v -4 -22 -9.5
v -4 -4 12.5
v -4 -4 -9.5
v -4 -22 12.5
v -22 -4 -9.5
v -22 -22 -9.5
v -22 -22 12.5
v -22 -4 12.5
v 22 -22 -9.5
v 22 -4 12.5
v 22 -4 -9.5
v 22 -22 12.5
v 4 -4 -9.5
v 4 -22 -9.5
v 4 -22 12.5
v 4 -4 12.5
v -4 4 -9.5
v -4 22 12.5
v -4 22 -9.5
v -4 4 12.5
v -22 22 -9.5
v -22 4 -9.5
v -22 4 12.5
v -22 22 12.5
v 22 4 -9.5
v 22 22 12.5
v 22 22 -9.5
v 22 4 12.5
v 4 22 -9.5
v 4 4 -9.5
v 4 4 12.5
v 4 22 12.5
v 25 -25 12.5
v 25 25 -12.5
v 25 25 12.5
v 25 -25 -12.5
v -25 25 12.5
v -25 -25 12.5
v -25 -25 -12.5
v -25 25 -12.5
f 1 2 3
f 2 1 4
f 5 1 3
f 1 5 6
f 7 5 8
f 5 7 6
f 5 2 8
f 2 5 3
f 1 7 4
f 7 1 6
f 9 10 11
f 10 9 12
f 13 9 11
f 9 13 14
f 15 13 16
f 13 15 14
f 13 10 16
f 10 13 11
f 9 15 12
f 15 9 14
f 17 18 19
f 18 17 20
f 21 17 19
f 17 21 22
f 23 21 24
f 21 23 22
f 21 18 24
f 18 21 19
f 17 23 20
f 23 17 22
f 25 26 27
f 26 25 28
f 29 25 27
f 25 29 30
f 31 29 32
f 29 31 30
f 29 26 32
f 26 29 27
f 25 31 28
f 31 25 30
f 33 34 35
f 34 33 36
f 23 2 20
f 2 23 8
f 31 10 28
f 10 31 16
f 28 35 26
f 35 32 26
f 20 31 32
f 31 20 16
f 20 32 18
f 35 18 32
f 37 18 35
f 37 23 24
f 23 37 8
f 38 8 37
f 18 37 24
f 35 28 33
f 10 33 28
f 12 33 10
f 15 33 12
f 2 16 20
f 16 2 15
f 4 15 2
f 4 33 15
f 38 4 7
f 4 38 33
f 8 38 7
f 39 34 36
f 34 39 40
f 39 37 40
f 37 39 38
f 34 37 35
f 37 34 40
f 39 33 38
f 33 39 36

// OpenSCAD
$fn = 32;

// ----------------------------------------------------------------------
// Pocket plate 50 x 50 x 25
// 2 x 2 pockets 18 mm square, 22 mm deep
// ----------------------------------------------------------------------

// --- parameters (mm) ---
thickness = 25;  // plate thickness
floor_t = 3;     // material left under each pocket
pocket = 18;     // pocket side length
pitch_x = 26;    // pocket pitch along X
pitch_y = 26;    // pocket pitch along Y
cols = 2;        // pockets per row
rows = 2;        // rows of pockets

// --- derived feature positions (mm) ---
depth = thickness - floor_t;        // = 22   pocket depth, down to the floor
span_x = (cols - 1) * pitch_x;      // = 26   distance between outer pockets
span_y = (rows - 1) * pitch_y;      // = 26   distance between outer pocket rows
origin_x = -span_x / 2;             // = -13   X of the first pocket
origin_y = -span_y / 2;             // = -13   Y of the first pocket
plate = [span_x + pocket + 6, span_y + pocket + 6, thickness];  // = [50, 50, 25]   overall size: pockets plus 3 mm of wall on each side
feature_centers = [
  [origin_x + 0 * pitch_x, origin_y + 0 * pitch_y],
  [origin_x + 1 * pitch_x, origin_y + 0 * pitch_y],
  [origin_x + 0 * pitch_x, origin_y + 1 * pitch_y],
  [origin_x + 1 * pitch_x, origin_y + 1 * pitch_y]
];   // pocket centres, used verbatim by the cutter loop

// plate outline, then one pocket per centre in feature_centers
difference() {
  cube(plate, center = true);
  for (centre = feature_centers)
    translate([centre[0] - pocket / 2, centre[1] - pocket / 2, plate[2] / 2 - depth])
      cube([pocket, pocket, depth + 1]);  // centred on the declared pocket centre
}
